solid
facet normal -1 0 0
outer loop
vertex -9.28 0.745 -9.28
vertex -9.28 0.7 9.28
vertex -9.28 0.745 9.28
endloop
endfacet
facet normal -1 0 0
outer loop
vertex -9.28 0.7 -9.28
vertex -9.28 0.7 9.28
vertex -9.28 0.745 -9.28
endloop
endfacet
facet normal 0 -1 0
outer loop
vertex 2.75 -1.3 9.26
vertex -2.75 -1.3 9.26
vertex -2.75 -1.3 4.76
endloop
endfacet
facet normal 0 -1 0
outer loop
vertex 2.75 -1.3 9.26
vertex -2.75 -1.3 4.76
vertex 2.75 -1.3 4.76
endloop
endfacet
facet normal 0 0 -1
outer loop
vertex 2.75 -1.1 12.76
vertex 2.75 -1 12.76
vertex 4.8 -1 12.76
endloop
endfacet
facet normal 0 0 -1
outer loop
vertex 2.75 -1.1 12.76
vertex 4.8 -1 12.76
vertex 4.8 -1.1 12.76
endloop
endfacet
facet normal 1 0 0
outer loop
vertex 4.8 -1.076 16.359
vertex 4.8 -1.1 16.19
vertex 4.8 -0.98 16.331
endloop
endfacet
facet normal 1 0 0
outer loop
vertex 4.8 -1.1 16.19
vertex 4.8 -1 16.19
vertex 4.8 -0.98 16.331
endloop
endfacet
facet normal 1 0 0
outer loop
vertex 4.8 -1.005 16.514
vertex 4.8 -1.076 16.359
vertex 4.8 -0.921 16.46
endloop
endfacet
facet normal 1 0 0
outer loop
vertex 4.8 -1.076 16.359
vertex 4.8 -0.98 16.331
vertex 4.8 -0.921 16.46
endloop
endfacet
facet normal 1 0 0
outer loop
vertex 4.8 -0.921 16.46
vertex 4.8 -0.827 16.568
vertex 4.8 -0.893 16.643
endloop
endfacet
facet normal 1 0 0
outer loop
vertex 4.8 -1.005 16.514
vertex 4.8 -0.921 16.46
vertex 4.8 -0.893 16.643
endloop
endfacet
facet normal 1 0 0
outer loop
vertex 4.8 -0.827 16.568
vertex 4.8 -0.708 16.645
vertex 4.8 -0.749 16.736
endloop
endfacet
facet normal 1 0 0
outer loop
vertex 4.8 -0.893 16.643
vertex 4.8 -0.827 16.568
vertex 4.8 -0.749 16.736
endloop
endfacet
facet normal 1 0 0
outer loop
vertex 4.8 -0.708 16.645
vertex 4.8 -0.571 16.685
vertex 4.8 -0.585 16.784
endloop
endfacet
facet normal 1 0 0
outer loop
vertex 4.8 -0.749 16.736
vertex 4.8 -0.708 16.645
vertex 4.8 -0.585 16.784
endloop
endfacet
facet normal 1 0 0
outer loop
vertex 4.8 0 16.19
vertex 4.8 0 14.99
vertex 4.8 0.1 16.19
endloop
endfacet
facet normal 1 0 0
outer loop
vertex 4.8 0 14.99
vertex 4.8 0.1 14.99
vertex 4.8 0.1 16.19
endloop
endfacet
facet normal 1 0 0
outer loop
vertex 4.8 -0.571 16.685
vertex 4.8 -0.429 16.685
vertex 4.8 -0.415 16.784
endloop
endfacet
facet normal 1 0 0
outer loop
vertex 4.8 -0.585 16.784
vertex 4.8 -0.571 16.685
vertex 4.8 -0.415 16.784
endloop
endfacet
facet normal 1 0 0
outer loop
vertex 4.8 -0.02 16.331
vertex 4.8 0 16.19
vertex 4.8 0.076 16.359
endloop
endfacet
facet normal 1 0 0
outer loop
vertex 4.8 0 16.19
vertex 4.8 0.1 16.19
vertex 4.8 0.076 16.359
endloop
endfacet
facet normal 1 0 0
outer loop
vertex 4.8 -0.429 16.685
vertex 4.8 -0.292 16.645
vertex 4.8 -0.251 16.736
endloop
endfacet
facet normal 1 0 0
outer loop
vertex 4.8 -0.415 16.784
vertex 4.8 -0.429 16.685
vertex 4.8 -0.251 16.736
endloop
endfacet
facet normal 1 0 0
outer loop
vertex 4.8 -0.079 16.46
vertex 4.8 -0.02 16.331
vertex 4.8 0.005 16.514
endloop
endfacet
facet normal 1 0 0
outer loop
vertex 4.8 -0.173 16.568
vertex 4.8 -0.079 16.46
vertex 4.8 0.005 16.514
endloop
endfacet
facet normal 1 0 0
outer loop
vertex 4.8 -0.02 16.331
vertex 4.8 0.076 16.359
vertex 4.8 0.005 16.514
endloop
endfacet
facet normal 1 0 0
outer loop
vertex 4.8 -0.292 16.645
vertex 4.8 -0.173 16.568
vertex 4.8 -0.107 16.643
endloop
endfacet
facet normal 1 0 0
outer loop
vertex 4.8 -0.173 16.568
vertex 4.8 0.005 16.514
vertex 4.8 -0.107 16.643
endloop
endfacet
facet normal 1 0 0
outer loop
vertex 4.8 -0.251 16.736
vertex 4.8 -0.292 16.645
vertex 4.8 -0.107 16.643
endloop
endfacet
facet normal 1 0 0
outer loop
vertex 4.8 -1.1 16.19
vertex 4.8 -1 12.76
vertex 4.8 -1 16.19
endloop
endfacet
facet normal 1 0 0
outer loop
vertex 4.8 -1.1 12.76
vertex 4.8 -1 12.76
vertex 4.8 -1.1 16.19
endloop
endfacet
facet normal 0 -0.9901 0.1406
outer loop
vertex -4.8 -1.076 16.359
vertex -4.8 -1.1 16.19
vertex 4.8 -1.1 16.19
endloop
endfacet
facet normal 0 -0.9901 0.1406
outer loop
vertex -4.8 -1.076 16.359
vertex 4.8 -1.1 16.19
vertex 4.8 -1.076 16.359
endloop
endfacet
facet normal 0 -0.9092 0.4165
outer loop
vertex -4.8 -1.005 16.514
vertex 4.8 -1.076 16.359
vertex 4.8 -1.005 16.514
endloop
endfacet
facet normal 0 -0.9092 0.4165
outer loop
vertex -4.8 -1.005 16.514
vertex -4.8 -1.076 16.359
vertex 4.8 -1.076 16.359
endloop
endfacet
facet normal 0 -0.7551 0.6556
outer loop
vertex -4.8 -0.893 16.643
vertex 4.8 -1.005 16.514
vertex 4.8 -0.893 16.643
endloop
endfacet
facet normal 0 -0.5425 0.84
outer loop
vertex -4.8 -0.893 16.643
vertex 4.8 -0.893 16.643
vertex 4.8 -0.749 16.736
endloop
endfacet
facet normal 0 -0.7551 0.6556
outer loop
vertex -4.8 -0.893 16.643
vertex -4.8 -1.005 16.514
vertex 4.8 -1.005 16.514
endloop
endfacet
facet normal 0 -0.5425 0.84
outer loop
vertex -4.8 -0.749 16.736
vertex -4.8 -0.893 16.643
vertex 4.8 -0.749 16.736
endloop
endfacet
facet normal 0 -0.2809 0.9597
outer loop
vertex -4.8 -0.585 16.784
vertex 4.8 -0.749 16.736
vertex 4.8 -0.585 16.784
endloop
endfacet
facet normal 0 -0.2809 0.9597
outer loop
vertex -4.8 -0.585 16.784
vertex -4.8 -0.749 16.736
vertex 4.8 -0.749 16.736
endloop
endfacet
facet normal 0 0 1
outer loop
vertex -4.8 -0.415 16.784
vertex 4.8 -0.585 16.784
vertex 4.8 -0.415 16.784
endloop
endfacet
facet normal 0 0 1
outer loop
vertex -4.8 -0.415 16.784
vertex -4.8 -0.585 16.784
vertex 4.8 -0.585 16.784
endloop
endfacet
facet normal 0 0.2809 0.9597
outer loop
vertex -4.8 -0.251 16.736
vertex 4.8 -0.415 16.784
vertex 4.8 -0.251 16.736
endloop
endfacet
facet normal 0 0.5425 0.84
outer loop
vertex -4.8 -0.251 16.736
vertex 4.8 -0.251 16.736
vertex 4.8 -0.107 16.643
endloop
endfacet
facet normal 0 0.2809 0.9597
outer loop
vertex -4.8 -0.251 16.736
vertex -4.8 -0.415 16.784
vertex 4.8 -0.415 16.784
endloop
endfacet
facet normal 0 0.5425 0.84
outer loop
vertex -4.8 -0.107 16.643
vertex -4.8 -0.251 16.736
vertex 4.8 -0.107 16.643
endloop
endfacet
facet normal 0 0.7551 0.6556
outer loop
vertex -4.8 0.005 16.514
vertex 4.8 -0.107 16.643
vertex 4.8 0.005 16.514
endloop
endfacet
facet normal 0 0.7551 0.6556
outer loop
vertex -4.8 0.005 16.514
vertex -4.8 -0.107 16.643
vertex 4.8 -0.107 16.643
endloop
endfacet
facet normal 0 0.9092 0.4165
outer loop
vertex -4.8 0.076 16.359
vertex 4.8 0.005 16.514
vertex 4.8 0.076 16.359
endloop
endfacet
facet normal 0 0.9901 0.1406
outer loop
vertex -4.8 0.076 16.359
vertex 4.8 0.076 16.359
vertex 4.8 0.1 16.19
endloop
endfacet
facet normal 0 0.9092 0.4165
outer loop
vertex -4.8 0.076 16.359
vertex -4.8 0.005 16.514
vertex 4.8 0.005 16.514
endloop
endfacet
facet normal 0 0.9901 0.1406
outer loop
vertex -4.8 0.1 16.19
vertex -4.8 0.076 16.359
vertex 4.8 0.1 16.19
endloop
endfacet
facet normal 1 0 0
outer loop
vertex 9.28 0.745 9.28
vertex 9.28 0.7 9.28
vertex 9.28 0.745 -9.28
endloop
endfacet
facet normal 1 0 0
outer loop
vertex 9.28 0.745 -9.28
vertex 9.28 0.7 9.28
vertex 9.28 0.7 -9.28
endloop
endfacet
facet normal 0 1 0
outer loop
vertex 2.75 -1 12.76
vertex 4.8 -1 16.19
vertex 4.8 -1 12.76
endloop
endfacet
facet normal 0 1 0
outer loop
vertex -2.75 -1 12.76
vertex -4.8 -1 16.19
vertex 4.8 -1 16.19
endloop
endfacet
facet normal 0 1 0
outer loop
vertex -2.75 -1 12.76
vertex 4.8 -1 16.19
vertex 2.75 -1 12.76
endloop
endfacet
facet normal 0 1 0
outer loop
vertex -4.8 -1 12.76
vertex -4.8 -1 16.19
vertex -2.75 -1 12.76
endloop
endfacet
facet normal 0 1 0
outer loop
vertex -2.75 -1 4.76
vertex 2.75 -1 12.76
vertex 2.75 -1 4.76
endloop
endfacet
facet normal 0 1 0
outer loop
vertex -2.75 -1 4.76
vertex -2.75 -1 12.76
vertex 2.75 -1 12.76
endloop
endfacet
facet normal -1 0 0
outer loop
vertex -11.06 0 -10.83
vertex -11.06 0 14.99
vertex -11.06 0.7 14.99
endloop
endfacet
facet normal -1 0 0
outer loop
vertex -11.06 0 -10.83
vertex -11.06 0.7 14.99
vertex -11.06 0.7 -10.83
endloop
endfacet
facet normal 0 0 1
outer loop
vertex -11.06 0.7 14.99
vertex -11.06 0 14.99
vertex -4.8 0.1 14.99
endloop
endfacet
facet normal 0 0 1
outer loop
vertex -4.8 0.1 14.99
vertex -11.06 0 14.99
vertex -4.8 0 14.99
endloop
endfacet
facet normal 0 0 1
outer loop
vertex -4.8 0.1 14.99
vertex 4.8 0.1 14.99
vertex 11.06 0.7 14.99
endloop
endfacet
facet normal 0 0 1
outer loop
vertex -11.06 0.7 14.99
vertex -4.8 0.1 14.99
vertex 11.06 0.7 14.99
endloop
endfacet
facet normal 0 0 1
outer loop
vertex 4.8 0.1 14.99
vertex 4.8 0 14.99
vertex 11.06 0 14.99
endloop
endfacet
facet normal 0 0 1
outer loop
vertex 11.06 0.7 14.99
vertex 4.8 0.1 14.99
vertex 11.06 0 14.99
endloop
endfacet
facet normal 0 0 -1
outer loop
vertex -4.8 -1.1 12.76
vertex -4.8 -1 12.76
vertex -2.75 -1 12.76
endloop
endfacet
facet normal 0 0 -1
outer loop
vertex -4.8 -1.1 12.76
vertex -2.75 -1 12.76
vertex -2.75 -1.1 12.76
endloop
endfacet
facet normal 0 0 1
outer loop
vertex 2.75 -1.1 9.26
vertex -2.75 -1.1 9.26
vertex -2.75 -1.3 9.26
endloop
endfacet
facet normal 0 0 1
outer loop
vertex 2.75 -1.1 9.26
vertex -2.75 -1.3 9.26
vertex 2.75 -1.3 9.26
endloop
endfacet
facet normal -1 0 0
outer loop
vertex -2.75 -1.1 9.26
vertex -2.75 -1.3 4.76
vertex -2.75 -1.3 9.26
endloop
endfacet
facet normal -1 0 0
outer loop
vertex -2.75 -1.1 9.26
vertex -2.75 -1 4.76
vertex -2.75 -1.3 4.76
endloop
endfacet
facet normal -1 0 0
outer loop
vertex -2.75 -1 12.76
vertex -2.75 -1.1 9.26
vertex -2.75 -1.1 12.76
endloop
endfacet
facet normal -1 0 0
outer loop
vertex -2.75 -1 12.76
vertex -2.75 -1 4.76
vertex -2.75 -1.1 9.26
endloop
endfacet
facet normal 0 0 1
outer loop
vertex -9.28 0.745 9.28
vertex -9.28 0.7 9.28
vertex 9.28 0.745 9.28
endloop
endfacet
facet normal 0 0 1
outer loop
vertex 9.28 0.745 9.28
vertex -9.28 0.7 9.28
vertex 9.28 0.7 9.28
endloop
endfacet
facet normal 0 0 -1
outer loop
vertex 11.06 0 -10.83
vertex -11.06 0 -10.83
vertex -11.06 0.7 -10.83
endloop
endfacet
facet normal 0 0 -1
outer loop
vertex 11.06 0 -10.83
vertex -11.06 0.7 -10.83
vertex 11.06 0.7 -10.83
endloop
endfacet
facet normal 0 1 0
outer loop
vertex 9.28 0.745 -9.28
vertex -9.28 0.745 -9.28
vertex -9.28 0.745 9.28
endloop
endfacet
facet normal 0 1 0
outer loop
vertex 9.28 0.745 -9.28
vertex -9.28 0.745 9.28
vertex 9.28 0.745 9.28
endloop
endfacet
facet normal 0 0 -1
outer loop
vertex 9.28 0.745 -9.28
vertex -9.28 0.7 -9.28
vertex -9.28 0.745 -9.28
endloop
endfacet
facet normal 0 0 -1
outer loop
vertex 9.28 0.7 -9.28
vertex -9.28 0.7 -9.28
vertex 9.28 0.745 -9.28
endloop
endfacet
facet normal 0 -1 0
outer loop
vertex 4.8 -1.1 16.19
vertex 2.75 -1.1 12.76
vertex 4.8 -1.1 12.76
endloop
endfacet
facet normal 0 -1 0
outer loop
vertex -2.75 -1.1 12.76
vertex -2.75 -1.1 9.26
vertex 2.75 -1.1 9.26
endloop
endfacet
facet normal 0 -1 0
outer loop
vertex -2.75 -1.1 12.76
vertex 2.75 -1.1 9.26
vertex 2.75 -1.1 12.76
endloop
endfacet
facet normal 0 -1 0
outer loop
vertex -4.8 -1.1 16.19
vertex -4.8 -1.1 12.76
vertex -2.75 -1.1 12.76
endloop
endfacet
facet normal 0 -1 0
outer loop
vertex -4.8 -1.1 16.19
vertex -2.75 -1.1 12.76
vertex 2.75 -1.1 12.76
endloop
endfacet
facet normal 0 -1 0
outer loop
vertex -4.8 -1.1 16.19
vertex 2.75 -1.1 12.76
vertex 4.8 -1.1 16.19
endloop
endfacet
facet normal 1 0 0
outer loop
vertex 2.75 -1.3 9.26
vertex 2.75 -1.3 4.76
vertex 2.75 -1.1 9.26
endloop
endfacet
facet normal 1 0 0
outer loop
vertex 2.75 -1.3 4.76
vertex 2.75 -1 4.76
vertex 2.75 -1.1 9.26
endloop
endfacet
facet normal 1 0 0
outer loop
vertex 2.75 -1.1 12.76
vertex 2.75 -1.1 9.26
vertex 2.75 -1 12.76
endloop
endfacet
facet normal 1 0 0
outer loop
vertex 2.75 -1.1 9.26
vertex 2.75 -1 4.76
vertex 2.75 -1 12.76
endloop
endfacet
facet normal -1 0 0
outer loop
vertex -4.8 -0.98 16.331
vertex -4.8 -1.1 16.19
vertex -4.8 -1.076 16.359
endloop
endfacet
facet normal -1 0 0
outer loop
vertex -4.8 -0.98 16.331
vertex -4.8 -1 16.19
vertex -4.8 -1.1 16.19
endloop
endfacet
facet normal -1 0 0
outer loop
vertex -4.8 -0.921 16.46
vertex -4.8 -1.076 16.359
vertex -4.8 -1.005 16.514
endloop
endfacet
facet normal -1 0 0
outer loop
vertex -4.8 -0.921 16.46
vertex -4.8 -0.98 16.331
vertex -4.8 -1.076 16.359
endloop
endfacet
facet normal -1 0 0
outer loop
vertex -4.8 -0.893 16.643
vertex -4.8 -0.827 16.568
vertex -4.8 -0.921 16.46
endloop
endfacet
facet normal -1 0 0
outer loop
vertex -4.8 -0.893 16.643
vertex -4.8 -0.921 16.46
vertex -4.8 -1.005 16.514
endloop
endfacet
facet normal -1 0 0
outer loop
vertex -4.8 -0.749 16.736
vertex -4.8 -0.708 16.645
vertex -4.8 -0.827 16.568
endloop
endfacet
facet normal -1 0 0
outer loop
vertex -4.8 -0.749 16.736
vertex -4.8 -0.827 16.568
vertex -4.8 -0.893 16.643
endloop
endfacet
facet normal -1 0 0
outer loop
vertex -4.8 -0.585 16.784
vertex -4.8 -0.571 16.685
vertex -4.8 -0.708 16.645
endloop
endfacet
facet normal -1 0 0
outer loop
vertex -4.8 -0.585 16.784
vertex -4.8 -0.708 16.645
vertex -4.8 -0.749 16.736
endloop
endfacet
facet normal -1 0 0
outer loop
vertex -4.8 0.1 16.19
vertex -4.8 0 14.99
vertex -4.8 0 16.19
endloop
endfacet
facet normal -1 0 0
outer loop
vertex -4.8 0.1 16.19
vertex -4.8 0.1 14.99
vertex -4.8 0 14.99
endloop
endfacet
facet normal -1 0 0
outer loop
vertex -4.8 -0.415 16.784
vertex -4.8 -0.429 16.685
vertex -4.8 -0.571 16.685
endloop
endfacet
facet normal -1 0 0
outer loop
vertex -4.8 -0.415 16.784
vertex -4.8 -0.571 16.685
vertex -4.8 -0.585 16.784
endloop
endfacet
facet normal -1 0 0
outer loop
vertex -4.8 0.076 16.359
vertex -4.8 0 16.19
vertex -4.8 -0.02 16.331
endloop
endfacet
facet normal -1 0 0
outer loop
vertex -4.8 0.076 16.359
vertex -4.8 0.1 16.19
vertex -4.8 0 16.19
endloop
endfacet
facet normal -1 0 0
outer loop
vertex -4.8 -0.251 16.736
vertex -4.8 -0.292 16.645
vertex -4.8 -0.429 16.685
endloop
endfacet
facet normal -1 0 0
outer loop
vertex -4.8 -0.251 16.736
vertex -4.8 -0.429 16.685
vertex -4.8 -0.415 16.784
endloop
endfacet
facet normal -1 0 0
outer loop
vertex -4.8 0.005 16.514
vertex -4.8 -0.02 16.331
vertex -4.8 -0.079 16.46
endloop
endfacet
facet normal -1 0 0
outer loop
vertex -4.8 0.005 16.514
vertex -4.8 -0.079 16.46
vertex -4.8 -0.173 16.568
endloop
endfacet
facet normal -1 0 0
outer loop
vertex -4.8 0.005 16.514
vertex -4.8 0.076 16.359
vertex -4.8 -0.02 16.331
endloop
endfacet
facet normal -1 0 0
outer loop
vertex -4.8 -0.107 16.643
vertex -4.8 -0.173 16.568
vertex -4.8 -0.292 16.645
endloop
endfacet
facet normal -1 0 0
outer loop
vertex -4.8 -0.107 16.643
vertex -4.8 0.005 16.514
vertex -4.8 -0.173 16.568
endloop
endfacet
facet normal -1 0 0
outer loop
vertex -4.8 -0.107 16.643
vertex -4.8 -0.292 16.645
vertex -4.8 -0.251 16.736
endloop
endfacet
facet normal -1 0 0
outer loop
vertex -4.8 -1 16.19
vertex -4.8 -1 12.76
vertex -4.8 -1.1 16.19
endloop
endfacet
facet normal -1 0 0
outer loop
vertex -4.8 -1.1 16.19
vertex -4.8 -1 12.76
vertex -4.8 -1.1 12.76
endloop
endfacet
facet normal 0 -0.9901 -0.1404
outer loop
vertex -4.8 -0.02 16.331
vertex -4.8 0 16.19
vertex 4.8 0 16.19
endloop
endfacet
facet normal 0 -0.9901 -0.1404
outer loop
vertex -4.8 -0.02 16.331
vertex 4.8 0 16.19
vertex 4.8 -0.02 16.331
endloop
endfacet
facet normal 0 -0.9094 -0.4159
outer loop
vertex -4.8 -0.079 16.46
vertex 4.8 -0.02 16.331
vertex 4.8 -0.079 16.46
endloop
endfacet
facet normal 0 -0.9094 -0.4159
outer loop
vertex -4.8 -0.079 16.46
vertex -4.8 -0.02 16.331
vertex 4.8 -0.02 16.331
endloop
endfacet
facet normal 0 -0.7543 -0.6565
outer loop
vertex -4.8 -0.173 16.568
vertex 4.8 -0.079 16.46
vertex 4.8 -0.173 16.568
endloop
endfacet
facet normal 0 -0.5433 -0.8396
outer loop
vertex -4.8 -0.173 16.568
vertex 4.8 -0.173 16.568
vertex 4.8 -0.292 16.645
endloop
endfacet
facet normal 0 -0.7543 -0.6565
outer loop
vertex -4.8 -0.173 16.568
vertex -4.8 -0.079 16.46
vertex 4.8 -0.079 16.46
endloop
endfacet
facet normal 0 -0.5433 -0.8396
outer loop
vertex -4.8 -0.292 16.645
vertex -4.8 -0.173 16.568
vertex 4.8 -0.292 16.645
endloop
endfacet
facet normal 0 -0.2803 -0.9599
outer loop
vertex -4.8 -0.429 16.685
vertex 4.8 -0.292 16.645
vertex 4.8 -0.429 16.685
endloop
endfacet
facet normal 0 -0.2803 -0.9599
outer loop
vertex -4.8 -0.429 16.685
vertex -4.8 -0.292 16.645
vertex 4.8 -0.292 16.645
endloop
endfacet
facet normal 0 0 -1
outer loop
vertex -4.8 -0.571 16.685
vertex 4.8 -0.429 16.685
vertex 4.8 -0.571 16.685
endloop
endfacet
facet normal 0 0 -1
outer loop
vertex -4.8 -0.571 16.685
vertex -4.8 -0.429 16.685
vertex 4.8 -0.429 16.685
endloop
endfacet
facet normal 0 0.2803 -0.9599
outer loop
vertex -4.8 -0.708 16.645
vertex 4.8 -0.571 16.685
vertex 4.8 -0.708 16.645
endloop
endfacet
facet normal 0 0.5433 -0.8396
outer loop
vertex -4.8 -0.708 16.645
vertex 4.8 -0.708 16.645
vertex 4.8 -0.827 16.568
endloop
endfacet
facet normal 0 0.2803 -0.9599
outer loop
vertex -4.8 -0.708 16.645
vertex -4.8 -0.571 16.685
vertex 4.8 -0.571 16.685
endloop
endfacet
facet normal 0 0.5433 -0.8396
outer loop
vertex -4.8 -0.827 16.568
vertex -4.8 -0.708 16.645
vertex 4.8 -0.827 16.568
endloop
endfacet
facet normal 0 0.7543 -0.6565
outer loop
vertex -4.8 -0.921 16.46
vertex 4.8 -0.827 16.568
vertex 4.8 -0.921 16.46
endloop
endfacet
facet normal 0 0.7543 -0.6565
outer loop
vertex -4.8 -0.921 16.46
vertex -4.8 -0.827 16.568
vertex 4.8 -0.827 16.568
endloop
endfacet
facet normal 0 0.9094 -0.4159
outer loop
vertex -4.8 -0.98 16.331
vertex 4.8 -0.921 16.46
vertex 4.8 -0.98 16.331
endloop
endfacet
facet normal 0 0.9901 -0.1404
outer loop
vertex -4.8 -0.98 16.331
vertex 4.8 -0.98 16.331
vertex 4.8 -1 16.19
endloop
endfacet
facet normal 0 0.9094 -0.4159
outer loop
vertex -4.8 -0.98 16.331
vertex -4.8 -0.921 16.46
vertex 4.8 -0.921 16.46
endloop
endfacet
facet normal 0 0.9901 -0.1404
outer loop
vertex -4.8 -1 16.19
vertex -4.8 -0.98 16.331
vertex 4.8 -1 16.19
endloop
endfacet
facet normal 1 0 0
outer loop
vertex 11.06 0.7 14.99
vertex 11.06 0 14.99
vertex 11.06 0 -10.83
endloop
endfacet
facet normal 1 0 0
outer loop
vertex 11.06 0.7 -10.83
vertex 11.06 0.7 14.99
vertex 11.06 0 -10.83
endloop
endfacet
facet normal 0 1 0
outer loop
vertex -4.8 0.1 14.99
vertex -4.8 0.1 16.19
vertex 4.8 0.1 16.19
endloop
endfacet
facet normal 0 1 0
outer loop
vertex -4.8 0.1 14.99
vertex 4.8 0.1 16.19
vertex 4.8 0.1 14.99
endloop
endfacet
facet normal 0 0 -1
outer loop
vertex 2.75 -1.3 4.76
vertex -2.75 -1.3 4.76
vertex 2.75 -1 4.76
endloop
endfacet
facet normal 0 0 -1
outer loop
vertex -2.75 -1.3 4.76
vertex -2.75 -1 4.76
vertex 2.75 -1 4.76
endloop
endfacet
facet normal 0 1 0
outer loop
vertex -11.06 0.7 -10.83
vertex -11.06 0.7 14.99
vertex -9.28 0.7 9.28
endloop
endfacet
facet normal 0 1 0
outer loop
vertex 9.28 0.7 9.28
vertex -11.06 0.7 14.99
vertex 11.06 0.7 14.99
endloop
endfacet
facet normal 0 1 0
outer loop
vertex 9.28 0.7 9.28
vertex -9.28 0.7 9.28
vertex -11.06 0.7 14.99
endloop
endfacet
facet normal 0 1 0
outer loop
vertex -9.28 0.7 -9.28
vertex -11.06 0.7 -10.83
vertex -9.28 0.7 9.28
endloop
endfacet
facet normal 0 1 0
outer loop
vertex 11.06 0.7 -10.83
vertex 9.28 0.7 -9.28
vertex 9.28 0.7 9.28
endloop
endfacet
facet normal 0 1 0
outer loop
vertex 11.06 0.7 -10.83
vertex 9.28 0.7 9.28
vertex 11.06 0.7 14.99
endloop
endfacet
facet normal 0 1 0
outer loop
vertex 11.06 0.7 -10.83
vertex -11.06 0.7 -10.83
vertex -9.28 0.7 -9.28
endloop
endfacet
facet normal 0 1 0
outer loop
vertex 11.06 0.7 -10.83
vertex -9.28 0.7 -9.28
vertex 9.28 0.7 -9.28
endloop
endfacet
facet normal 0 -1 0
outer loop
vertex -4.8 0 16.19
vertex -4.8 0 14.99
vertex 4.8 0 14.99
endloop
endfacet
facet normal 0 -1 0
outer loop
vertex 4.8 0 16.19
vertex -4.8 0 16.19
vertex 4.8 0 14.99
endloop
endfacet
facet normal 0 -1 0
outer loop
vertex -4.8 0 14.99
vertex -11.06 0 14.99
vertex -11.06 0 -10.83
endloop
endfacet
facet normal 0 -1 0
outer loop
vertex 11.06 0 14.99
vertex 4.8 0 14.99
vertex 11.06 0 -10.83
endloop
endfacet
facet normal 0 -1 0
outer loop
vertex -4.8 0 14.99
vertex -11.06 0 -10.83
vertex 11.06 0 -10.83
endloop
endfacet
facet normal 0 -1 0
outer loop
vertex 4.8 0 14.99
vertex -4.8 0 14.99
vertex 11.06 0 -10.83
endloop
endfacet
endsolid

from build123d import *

# Parameters (mm, degrees)
SKETCH_1_W           = 22.12
SKETCH_1_H           = 25.82
SKETCH_1_W_2         = 18.56
SKETCH_1_H_2         = 18.56
EXTRUDE_1_DEPTH      = 0.7
SKETCH_1_2_W         = 18.56
SKETCH_1_2_H         = 18.56
EXTRUDE_2_DEPTH      = 0.745
EXTRUDE_3_DEPTH      = 4.8
EXTRUDE_3_DEPTH_BACK = 4.8
SKETCH_3_W           = 5.5
SKETCH_3_H           = 8
EXTRUDE_4_DEPTH      = 0.1
SKETCH_4_W           = 5.5
SKETCH_4_H           = 4.5
EXTRUDE_5_DEPTH      = 0.2


with BuildPart() as part:
    # 草图1 → 凸台-拉伸1 (new body)
    with BuildSketch(Plane(origin=(0, 0, 0), x_dir=(1, 0, 0), z_dir=(0, 1, 0))):
        with Locations((0, -2.08)):
            Rectangle(SKETCH_1_W, SKETCH_1_H)
        Rectangle(SKETCH_1_W_2, SKETCH_1_H_2, mode=Mode.SUBTRACT)
    extrude(amount=EXTRUDE_1_DEPTH)

    # 草图1<2> → 凸台-拉伸2 (add)
    with BuildSketch(Plane(origin=(0, 0, 0), x_dir=(1, 0, 0), z_dir=(0, 1, 0))):
        Rectangle(SKETCH_1_2_W, SKETCH_1_2_H)
    extrude(amount=EXTRUDE_2_DEPTH)

    # 草图2 → 凸台-拉伸3 (add, two sides: drawn at the far end of the back side and taken through both)
    with BuildSketch(Plane(origin=(0, 0, 0), x_dir=(0, 0, -1), z_dir=(1, 0, 0)).offset(-EXTRUDE_3_DEPTH_BACK)):
        with BuildLine():
            Line((-14.99, 0), (-16.19, 0))
            ThreePointArc((-16.19, 0), (-16.69, -0.5), (-16.19, -1))
            Line((-16.19, -1), (-12.76, -1))
            Line((-12.76, -1), (-12.76, -1.1))
            Line((-12.76, -1.1), (-16.19, -1.1))
            ThreePointArc((-16.19, -1.1), (-16.79, -0.5), (-16.19, 0.1))
            Line((-16.19, 0.1), (-14.99, 0.1))
            Line((-14.99, 0.1), (-14.99, 0))
        make_face()
    extrude(amount=EXTRUDE_3_DEPTH + EXTRUDE_3_DEPTH_BACK)

    # 草图3 → 凸台-拉伸4 (add)
    with BuildSketch(Plane.XZ.offset(1.1)):
        with Locations((0, 8.76)):
            Rectangle(SKETCH_3_W, SKETCH_3_H)
    extrude(amount=-EXTRUDE_4_DEPTH)

    # 草图4 → 凸台-拉伸5 (add)
    with BuildSketch(Plane.XZ.offset(1.1)):
        with Locations((0, 7.01)):
            Rectangle(SKETCH_4_W, SKETCH_4_H)
    extrude(amount=EXTRUDE_5_DEPTH)


solid = part.part
